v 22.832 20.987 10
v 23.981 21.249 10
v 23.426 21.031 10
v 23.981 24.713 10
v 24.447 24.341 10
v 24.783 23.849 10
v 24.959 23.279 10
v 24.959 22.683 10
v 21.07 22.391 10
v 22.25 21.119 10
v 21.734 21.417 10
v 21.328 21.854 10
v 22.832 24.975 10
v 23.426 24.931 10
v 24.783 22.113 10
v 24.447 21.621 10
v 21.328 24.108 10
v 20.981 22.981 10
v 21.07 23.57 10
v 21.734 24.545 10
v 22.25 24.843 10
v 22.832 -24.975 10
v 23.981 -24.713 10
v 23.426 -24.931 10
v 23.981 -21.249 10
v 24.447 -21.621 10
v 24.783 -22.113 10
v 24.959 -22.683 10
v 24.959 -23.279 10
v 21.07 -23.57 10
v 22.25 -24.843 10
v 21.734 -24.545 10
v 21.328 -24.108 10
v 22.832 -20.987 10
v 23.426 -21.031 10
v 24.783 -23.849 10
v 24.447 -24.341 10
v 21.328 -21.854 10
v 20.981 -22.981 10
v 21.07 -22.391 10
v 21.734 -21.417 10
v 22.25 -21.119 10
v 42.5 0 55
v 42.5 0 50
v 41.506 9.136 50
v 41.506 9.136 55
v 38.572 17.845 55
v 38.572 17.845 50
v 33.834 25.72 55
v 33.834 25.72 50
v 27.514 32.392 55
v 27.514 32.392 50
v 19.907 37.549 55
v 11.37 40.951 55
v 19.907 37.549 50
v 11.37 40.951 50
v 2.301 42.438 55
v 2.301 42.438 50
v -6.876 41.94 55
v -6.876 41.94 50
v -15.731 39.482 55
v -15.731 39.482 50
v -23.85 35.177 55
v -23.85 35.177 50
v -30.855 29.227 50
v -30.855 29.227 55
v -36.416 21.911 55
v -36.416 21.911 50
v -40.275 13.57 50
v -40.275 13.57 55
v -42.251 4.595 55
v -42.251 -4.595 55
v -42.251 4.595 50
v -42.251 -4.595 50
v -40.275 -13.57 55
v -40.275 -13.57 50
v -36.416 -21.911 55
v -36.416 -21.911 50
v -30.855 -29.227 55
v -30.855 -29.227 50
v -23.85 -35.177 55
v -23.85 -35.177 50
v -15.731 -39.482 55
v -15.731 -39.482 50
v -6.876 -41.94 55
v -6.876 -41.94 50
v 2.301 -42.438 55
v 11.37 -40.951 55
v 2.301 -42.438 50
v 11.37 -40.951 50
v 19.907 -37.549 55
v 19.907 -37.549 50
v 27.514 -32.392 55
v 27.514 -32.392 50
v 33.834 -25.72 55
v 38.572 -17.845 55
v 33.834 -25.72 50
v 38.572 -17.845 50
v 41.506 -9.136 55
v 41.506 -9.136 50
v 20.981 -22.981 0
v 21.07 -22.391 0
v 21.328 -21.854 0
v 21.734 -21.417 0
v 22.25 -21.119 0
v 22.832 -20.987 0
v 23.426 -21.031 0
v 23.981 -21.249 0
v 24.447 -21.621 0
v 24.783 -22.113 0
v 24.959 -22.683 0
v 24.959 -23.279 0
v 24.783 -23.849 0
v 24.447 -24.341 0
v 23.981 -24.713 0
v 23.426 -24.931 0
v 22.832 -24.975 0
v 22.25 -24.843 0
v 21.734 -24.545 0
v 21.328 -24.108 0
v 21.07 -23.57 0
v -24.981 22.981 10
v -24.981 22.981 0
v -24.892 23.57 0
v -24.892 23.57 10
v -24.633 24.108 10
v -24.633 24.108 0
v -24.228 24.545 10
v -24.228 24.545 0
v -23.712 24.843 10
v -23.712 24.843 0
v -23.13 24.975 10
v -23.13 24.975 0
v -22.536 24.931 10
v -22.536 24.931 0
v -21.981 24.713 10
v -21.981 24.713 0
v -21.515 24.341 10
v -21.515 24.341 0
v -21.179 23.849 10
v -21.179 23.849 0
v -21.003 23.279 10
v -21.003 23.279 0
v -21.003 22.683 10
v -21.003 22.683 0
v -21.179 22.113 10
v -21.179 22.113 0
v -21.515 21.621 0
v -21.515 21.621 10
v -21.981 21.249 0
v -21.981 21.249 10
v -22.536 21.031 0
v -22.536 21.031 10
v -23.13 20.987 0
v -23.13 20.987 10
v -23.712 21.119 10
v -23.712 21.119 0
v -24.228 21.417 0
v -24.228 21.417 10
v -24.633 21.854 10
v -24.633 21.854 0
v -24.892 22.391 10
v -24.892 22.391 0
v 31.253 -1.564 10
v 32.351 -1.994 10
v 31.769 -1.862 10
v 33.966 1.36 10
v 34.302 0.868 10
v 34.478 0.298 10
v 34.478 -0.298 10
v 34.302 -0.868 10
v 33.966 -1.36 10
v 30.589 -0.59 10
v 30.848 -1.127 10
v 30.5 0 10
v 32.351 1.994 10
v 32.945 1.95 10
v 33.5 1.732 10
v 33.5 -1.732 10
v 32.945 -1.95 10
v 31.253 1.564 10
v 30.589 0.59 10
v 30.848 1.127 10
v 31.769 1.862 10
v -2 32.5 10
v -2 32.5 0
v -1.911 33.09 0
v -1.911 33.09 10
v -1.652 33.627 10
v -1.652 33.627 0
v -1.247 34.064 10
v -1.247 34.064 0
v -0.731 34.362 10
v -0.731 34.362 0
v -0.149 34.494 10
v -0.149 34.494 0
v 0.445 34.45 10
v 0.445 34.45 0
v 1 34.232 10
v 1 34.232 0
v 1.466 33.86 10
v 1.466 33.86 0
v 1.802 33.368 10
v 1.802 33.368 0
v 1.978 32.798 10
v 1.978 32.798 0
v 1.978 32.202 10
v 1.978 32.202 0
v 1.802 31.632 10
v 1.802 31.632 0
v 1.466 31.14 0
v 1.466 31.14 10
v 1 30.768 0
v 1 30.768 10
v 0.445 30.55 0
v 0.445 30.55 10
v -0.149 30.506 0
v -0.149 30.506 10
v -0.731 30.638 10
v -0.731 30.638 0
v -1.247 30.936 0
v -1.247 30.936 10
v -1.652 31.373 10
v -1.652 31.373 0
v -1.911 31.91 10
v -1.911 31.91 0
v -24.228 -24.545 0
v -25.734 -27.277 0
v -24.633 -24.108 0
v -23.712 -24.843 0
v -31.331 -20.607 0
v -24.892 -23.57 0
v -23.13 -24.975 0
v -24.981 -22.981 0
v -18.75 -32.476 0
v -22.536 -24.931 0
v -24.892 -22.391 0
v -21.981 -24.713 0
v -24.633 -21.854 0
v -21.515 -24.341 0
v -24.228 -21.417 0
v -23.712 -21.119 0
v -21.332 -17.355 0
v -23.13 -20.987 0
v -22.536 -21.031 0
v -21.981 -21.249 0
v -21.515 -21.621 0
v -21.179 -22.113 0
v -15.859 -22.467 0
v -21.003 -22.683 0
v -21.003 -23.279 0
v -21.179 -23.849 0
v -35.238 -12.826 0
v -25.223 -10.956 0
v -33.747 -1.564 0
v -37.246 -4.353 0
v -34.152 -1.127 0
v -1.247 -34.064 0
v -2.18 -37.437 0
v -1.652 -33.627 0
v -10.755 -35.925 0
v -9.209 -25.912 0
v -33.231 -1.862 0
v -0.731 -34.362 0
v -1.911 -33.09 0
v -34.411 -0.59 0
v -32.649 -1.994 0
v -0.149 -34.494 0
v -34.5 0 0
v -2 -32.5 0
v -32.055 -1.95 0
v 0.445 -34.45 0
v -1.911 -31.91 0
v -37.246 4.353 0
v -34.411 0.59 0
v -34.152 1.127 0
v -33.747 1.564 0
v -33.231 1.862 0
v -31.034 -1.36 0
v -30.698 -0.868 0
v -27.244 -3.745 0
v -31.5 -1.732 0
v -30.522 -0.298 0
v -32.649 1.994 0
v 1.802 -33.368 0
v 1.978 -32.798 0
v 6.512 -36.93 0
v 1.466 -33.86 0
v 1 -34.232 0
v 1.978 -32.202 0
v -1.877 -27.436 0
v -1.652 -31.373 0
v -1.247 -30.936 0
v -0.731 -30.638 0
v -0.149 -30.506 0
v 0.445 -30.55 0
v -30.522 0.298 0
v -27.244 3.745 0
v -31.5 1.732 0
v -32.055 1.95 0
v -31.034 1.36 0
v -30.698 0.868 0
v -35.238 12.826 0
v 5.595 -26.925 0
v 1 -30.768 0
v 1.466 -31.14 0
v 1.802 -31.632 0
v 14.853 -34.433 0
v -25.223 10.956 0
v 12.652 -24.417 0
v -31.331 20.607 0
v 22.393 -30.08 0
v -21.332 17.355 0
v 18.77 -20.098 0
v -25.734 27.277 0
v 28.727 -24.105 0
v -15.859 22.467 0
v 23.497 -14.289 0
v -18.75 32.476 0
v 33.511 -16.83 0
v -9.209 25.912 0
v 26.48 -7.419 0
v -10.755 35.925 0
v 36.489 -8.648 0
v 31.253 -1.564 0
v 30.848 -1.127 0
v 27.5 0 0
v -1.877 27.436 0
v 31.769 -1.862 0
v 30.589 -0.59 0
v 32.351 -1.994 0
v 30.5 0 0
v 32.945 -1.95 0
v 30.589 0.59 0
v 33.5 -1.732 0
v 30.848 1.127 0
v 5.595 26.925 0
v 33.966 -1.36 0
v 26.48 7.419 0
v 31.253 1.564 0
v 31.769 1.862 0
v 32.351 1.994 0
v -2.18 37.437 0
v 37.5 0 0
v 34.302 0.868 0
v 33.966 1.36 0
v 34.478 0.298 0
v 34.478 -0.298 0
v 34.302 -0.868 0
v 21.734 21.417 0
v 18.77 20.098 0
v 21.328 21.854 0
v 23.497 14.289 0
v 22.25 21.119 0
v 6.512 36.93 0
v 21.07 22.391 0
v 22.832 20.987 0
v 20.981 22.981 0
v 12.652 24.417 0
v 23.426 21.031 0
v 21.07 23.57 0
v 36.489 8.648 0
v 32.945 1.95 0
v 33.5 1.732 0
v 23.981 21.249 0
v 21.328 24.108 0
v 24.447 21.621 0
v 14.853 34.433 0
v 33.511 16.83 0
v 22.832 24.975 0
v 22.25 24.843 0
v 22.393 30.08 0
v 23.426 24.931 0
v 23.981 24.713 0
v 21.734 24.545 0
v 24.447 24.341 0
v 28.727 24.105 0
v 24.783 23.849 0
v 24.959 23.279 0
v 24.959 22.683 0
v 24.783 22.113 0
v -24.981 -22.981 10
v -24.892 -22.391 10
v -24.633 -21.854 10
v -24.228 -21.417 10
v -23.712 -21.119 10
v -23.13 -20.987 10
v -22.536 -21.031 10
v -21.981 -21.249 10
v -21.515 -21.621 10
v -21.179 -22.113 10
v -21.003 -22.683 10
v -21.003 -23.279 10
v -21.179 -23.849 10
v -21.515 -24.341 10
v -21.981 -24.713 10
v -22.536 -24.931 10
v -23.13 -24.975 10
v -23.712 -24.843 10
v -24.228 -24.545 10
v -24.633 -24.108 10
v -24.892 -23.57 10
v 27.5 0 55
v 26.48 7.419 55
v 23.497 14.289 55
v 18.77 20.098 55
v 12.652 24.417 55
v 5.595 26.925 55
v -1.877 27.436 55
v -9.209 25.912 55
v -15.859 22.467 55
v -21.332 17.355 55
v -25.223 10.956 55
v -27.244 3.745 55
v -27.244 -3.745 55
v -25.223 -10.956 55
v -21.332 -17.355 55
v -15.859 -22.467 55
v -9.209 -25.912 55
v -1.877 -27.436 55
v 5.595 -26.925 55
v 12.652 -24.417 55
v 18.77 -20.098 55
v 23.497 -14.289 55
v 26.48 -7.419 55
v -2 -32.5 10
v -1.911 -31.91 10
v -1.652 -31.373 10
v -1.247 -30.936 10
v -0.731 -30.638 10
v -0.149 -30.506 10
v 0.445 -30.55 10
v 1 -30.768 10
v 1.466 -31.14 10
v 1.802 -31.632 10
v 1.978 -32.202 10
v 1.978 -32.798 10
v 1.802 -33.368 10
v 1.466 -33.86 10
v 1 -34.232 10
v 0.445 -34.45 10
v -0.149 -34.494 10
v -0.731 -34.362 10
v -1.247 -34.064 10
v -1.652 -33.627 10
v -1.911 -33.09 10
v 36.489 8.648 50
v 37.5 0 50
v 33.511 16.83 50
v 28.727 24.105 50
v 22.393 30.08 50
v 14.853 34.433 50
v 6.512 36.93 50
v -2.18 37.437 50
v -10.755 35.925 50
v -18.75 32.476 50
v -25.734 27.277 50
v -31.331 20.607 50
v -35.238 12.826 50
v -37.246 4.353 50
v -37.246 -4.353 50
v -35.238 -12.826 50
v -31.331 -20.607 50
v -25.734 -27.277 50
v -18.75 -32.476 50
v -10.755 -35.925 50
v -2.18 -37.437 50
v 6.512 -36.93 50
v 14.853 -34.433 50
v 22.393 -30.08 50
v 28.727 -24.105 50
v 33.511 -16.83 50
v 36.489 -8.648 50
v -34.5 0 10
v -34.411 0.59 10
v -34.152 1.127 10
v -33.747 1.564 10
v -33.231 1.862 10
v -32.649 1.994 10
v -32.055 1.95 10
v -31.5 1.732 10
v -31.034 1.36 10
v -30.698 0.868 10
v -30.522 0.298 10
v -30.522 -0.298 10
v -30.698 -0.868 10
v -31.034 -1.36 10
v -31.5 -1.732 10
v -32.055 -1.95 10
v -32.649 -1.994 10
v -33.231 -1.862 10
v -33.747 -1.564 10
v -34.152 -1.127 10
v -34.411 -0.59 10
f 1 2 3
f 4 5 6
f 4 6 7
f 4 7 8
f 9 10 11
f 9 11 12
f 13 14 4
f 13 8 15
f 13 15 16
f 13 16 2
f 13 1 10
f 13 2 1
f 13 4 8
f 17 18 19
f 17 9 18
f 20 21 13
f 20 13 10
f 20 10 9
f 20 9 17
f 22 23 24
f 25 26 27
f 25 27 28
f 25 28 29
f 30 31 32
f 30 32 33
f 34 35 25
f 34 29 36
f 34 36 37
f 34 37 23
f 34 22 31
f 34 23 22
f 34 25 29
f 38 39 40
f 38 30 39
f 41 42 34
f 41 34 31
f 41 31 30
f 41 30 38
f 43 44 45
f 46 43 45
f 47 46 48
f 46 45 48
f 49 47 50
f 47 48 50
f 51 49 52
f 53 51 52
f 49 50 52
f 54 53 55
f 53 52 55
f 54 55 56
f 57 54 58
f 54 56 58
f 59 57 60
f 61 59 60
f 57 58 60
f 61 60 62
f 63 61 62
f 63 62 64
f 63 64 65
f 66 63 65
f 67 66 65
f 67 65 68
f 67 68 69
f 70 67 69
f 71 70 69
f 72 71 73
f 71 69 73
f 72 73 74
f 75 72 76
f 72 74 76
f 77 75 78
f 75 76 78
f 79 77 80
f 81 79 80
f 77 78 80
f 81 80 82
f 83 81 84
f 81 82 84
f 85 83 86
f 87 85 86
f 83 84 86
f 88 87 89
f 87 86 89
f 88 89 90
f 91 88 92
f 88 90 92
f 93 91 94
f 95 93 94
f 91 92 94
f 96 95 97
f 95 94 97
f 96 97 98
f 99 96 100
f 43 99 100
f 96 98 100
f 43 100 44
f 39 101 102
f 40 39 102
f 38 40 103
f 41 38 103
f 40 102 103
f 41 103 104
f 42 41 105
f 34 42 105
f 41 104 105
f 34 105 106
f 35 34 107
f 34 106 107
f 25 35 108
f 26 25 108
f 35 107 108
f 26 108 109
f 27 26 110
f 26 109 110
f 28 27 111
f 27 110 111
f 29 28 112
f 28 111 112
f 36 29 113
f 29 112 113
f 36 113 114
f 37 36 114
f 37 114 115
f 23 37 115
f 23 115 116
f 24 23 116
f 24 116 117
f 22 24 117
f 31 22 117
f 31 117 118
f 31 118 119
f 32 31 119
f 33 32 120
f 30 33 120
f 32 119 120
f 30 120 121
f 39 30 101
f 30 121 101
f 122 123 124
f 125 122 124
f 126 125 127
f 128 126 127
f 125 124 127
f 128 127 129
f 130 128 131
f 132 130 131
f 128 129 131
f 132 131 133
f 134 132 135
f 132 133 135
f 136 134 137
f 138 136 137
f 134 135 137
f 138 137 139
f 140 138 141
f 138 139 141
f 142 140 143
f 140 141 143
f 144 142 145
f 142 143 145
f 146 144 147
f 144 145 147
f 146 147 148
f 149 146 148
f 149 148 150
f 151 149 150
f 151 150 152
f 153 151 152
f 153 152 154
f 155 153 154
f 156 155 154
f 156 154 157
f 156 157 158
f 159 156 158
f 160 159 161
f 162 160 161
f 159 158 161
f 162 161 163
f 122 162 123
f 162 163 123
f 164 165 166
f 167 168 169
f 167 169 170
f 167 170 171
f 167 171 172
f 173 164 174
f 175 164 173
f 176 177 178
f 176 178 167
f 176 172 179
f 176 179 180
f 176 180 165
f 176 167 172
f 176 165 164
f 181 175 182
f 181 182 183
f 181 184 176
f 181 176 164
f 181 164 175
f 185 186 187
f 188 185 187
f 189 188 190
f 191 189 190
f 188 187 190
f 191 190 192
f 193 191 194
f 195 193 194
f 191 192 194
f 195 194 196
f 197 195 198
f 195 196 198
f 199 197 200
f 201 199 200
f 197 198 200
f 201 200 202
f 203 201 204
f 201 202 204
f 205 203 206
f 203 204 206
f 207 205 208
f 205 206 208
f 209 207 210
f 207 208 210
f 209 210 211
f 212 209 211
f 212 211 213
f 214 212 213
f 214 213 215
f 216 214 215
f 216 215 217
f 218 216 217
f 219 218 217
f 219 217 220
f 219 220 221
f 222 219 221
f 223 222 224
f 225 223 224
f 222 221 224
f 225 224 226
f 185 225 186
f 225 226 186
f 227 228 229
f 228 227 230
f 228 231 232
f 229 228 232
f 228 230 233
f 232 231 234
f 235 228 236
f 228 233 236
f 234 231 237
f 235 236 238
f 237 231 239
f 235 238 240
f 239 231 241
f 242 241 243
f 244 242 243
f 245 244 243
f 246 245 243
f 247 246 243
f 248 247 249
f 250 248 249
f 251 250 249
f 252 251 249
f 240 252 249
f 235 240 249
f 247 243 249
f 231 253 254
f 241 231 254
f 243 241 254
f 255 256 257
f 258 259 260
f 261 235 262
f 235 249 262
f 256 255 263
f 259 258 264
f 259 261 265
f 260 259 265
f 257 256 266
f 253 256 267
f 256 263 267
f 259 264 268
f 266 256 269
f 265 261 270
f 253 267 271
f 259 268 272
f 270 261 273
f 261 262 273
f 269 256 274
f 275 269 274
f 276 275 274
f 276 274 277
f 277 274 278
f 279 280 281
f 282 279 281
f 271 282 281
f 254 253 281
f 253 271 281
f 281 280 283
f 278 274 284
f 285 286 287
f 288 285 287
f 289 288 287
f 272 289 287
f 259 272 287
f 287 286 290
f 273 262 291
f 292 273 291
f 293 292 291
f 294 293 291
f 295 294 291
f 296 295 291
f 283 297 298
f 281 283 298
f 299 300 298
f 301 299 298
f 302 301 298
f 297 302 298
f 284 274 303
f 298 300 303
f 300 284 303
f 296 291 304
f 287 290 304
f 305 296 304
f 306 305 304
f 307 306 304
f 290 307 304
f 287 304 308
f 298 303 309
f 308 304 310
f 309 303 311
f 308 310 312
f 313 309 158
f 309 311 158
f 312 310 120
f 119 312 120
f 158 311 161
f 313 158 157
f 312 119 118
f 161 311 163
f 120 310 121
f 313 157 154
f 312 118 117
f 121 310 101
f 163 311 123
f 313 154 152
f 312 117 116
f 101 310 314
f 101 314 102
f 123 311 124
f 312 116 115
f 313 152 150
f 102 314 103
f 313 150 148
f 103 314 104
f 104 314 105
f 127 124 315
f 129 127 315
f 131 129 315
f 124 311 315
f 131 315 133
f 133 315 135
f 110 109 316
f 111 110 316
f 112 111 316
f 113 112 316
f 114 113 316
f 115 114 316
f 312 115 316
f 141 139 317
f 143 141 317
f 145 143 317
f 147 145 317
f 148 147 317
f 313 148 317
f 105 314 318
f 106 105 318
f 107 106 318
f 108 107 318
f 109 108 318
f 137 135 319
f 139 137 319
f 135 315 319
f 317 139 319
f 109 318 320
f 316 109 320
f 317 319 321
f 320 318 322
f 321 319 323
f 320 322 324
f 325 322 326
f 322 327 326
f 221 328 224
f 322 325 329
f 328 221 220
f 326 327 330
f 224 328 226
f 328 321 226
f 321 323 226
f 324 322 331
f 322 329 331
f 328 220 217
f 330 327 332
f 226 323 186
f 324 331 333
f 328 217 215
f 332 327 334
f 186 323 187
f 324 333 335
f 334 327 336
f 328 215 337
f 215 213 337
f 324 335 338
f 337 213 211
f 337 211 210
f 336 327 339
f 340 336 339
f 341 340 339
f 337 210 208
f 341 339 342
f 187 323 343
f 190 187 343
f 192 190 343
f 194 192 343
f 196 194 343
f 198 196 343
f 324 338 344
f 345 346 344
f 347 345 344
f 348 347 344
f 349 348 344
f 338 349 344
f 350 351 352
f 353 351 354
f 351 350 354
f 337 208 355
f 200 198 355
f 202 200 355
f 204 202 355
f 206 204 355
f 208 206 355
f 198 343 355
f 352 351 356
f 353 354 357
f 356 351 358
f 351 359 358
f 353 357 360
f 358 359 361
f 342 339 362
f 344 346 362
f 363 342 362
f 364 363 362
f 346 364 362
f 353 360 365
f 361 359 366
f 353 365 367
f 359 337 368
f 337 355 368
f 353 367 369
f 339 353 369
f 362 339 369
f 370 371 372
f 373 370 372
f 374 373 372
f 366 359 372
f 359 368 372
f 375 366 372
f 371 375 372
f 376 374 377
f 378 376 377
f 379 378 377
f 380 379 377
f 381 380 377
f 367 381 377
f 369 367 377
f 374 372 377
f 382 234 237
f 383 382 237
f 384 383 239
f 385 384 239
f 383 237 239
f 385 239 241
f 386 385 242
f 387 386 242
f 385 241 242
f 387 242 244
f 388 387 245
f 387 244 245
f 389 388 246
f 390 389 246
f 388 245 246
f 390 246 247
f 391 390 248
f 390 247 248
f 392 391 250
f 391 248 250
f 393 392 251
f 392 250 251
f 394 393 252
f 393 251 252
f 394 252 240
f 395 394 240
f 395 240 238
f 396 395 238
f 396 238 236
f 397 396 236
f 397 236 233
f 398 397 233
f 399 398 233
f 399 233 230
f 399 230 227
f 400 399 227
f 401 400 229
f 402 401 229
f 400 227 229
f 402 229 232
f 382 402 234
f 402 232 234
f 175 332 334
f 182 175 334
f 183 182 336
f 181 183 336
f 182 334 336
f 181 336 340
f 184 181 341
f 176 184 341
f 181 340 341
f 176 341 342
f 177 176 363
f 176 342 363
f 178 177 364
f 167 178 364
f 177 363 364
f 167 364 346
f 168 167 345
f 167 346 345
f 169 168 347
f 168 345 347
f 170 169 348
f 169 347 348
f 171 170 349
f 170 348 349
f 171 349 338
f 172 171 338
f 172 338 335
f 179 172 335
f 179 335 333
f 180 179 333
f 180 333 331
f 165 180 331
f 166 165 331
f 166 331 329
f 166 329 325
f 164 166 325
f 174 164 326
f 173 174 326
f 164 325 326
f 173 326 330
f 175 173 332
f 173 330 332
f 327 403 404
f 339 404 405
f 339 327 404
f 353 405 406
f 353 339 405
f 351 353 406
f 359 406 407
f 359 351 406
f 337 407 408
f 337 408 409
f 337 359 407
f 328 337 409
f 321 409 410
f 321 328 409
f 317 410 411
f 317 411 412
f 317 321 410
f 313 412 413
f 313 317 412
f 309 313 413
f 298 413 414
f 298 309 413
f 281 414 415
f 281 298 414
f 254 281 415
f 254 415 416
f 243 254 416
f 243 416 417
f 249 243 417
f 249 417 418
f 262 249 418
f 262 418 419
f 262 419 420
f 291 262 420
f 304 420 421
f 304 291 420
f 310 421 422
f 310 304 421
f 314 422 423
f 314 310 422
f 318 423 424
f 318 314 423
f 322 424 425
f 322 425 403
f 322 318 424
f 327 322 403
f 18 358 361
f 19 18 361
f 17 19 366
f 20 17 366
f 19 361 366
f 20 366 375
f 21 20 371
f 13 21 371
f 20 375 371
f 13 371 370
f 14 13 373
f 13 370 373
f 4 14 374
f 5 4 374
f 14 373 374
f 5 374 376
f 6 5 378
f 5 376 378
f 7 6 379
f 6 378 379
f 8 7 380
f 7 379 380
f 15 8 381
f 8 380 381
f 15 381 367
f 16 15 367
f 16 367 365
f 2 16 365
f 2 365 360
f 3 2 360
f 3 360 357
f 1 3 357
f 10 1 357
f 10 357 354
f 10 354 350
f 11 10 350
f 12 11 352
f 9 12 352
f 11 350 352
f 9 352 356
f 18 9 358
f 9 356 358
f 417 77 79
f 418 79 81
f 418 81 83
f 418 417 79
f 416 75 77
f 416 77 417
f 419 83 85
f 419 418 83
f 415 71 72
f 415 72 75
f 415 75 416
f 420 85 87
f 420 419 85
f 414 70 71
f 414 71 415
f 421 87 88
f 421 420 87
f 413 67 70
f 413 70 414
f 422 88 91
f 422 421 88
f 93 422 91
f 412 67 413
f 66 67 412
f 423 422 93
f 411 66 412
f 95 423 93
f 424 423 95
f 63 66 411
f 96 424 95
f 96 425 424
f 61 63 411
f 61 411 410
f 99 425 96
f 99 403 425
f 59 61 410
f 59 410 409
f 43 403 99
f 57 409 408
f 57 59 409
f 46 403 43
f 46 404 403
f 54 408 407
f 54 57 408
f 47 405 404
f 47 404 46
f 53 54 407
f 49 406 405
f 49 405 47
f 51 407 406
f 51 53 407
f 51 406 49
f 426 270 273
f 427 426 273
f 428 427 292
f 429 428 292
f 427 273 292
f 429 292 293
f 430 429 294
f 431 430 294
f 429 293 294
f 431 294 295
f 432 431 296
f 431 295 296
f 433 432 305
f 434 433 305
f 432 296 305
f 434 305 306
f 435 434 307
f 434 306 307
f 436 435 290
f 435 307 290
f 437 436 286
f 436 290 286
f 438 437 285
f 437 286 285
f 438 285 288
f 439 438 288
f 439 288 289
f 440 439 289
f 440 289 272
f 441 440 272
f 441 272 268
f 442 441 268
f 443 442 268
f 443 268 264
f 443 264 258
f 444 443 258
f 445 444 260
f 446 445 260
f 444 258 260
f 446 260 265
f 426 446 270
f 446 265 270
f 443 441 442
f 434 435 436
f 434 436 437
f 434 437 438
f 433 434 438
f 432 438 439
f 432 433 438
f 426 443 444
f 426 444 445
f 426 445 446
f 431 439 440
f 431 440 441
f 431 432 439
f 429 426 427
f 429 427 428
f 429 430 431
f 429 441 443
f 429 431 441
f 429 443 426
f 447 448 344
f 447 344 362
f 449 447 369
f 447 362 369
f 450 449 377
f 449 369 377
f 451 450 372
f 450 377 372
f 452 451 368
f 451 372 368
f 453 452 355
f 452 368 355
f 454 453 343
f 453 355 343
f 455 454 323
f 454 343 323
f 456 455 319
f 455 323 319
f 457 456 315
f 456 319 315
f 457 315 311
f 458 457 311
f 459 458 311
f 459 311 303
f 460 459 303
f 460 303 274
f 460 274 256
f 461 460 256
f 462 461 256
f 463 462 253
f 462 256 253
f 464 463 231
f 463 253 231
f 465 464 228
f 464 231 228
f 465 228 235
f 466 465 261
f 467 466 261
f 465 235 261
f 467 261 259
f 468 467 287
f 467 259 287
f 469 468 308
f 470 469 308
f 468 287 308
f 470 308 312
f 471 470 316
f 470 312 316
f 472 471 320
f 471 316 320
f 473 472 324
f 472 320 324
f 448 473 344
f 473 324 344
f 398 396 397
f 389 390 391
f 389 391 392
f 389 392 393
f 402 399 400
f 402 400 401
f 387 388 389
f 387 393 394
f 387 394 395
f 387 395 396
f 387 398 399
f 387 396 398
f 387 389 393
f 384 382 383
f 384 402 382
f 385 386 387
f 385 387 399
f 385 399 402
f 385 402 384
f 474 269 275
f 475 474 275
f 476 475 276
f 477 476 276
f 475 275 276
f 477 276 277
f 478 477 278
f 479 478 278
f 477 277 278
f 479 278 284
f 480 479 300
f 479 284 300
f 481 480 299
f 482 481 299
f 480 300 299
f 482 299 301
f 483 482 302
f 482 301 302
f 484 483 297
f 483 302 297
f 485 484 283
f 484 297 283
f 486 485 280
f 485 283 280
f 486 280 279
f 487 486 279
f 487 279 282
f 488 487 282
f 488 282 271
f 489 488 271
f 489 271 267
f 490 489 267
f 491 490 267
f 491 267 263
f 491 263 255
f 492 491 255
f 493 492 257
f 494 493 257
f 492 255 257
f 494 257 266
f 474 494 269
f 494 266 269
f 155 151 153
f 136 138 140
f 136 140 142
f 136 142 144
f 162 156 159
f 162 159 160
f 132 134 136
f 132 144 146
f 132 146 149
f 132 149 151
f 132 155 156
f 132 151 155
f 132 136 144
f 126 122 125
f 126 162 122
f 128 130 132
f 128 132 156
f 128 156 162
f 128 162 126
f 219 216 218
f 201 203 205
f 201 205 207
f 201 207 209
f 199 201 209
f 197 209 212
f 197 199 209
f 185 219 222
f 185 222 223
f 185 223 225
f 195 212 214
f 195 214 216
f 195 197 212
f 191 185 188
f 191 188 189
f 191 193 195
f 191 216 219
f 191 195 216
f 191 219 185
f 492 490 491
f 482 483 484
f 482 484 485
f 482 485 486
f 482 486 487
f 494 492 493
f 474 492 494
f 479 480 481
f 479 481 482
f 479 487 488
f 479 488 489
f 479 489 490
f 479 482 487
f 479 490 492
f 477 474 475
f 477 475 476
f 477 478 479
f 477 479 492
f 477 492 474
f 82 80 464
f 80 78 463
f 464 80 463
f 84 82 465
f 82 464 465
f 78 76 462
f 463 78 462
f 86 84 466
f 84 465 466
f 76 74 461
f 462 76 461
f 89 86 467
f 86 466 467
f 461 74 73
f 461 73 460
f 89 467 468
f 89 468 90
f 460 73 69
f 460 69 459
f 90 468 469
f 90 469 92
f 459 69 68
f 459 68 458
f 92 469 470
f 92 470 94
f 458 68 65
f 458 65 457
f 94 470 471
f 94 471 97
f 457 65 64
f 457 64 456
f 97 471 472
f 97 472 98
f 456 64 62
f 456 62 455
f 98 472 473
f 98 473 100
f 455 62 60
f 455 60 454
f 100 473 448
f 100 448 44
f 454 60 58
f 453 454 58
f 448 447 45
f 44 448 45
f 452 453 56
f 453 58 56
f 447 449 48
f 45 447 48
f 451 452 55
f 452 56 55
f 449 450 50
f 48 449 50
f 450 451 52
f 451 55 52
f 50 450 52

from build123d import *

# Parameters (mm, degrees)
SKETCH1_R           = 37.5
SKETCH1_R_2         = 27.5
BOSS_EXTRUDE1_DEPTH = 50
SKETCH2_R           = 42.5
SKETCH2_R_2         = 27.5
BOSS_EXTRUDE2_DEPTH = 5
SKETCH3_R           = 2
CUT_EXTRUDE1_DEPTH  = 10


with BuildPart() as part:
    # Sketch1 → Boss-Extrude1 (new body)
    with BuildSketch(Plane.XY):
        Circle(SKETCH1_R)
        Circle(SKETCH1_R_2, mode=Mode.SUBTRACT)
    extrude(amount=BOSS_EXTRUDE1_DEPTH)

    # Sketch2 → Boss-Extrude2 (add)
    with BuildSketch(Plane.XY.offset(50)):
        Circle(SKETCH2_R)
        Circle(SKETCH2_R_2, mode=Mode.SUBTRACT)
    extrude(amount=BOSS_EXTRUDE2_DEPTH)

    # Sketch3 → Cut-Extrude1 (cut)
    with BuildSketch(Plane(origin=(0, 0, 0), x_dir=(-1, 0, 0), z_dir=(0, 0, -1))):
        with Locations((0, 32.5)):
            Circle(SKETCH3_R)
        with Locations((22.980970389, 22.980970389)):
            Circle(SKETCH3_R)
        with Locations((32.5, 0)):
            Circle(SKETCH3_R)
        with Locations((22.980970389, -22.980970389)):
            Circle(SKETCH3_R)
        with Locations((0, -32.5)):
            Circle(SKETCH3_R)
        with Locations((-22.980970389, -22.980970389)):
            Circle(SKETCH3_R)
        with Locations((-32.5, 0)):
            Circle(SKETCH3_R)
        with Locations((-22.980970389, 22.980970389)):
            Circle(SKETCH3_R)
    extrude(amount=-CUT_EXTRUDE1_DEPTH, mode=Mode.SUBTRACT)


solid = part.part
